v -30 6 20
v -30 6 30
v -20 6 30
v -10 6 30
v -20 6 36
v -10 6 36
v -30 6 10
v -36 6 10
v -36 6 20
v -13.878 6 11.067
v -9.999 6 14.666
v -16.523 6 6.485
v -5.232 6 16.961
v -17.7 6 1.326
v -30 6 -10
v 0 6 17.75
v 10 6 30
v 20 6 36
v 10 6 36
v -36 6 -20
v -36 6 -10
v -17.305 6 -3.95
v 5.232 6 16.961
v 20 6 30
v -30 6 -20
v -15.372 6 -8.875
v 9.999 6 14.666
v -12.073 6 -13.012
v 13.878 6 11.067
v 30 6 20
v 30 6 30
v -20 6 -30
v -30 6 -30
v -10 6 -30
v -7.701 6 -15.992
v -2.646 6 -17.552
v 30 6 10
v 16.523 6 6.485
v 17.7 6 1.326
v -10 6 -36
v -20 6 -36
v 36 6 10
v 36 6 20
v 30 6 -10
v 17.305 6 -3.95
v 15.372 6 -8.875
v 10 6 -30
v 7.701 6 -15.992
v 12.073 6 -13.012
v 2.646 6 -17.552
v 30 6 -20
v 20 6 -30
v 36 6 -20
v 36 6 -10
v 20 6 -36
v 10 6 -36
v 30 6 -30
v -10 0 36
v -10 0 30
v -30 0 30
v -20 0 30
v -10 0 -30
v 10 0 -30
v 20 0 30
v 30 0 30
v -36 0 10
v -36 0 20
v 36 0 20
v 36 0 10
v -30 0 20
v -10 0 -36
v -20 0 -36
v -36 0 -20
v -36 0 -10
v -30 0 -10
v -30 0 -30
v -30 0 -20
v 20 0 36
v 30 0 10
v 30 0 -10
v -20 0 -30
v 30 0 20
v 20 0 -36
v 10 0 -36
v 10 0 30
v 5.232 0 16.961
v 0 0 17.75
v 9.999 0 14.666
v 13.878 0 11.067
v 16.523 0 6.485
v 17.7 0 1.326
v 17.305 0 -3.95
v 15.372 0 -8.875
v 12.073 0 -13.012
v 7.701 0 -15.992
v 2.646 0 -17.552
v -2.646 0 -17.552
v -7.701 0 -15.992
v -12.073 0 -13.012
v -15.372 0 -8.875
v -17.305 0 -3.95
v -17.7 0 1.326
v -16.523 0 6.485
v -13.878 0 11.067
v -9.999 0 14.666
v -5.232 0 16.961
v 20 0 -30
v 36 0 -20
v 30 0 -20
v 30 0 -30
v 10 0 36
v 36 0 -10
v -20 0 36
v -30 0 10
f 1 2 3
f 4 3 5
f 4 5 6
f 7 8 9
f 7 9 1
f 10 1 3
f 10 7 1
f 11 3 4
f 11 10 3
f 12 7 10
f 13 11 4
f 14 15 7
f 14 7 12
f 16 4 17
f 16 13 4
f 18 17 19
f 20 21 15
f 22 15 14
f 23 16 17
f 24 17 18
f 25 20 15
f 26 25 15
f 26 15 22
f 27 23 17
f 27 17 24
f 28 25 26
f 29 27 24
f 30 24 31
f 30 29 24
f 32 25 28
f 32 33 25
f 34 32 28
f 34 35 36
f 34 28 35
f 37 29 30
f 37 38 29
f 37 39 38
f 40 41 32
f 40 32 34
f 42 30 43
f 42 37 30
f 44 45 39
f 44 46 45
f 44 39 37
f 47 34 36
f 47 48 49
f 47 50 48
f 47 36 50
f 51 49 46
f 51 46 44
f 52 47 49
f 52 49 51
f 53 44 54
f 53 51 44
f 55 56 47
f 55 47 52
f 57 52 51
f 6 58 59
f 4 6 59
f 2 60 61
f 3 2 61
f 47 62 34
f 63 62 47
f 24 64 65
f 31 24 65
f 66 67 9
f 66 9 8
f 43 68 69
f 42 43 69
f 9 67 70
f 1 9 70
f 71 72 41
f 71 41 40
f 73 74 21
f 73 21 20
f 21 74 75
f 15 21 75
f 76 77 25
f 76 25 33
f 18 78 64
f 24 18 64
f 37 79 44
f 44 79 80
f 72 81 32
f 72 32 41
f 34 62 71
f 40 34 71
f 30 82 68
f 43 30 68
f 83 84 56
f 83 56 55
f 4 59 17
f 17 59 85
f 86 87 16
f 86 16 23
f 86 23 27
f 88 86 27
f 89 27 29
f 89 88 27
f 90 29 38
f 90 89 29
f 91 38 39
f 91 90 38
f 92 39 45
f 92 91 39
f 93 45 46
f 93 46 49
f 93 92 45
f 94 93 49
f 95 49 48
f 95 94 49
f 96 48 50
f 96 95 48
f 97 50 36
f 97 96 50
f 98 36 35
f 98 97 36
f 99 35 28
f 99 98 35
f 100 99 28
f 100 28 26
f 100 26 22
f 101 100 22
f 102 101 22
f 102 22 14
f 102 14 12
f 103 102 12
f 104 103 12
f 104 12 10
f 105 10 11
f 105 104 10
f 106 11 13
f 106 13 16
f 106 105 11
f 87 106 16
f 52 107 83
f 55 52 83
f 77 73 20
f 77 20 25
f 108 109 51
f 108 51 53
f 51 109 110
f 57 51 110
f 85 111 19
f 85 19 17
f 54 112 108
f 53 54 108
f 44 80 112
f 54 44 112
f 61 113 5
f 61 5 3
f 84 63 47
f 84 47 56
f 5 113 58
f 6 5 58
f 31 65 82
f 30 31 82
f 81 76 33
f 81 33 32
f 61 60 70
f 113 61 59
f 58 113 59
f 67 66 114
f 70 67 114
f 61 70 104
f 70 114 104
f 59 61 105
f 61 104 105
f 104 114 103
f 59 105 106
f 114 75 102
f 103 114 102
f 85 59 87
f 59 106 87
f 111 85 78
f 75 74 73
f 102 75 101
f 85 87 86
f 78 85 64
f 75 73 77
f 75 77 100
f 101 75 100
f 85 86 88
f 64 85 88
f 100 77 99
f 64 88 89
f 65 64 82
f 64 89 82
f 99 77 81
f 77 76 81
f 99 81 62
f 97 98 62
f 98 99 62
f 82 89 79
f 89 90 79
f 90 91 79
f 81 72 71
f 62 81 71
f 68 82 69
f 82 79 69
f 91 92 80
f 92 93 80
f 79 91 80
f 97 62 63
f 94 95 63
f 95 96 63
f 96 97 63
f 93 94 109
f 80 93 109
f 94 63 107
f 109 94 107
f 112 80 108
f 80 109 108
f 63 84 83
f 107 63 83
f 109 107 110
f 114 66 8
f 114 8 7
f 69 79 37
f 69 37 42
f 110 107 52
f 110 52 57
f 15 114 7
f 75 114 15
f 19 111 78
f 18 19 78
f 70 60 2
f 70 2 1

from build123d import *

# Parameters (mm, degrees)
SKETCH1_W           = 60
SKETCH1_H           = 60
SKETCH1_R           = 17.75
SKETCH1_W_2         = 10
SKETCH1_H_2         = 6
SKETCH1_W_3         = 6
SKETCH1_H_3         = 10
BOSS_EXTRUDE1_DEPTH = 6


with BuildPart() as part:
    # Sketch1 → Boss-Extrude1 (new body)
    # profile 1 of 9: a face of its own
    with BuildSketch(Plane(origin=(0, 0, 0), x_dir=(1, 0, 0), z_dir=(0, 1, 0))):
        Rectangle(SKETCH1_W, SKETCH1_H)
        with Locations(Location((0, 0, 0), (0, 0, 270))):
            Circle(SKETCH1_R, mode=Mode.SUBTRACT)
    # profile 2 of 9: a face of its own
    with BuildSketch(Plane(origin=(0, 0, 0), x_dir=(1, 0, 0), z_dir=(0, 1, 0))):
        with Locations((15, -33)):
            Rectangle(SKETCH1_W_2, SKETCH1_H_2)
    # profile 3 of 9: a face of its own
    with BuildSketch(Plane(origin=(0, 0, 0), x_dir=(1, 0, 0), z_dir=(0, 1, 0))):
        with Locations((-15, -33)):
            Rectangle(SKETCH1_W_2, SKETCH1_H_2)
    # profile 4 of 9: a face of its own
    with BuildSketch(Plane(origin=(0, 0, 0), x_dir=(1, 0, 0), z_dir=(0, 1, 0))):
        with Locations((-33, -15)):
            Rectangle(SKETCH1_W_3, SKETCH1_H_3)
    # profile 5 of 9: a face of its own
    with BuildSketch(Plane(origin=(0, 0, 0), x_dir=(1, 0, 0), z_dir=(0, 1, 0))):
        with Locations((-33, 15)):
            Rectangle(SKETCH1_W_3, SKETCH1_H_3)
    # profile 6 of 9: a face of its own
    with BuildSketch(Plane(origin=(0, 0, 0), x_dir=(1, 0, 0), z_dir=(0, 1, 0))):
        with Locations((-15, 33)):
            Rectangle(SKETCH1_W_2, SKETCH1_H_2)
    # profile 7 of 9: a face of its own
    with BuildSketch(Plane(origin=(0, 0, 0), x_dir=(1, 0, 0), z_dir=(0, 1, 0))):
        with Locations((15, 33)):
            Rectangle(SKETCH1_W_2, SKETCH1_H_2)
    # profile 8 of 9: a face of its own
    with BuildSketch(Plane(origin=(0, 0, 0), x_dir=(1, 0, 0), z_dir=(0, 1, 0))):
        with Locations((33, 15)):
            Rectangle(SKETCH1_W_3, SKETCH1_H_3)
    # profile 9 of 9: a face of its own
    with BuildSketch(Plane(origin=(0, 0, 0), x_dir=(1, 0, 0), z_dir=(0, 1, 0))):
        with Locations((33, -15)):
            Rectangle(SKETCH1_W_3, SKETCH1_H_3)
    extrude(amount=BOSS_EXTRUDE1_DEPTH)


solid = part.part
